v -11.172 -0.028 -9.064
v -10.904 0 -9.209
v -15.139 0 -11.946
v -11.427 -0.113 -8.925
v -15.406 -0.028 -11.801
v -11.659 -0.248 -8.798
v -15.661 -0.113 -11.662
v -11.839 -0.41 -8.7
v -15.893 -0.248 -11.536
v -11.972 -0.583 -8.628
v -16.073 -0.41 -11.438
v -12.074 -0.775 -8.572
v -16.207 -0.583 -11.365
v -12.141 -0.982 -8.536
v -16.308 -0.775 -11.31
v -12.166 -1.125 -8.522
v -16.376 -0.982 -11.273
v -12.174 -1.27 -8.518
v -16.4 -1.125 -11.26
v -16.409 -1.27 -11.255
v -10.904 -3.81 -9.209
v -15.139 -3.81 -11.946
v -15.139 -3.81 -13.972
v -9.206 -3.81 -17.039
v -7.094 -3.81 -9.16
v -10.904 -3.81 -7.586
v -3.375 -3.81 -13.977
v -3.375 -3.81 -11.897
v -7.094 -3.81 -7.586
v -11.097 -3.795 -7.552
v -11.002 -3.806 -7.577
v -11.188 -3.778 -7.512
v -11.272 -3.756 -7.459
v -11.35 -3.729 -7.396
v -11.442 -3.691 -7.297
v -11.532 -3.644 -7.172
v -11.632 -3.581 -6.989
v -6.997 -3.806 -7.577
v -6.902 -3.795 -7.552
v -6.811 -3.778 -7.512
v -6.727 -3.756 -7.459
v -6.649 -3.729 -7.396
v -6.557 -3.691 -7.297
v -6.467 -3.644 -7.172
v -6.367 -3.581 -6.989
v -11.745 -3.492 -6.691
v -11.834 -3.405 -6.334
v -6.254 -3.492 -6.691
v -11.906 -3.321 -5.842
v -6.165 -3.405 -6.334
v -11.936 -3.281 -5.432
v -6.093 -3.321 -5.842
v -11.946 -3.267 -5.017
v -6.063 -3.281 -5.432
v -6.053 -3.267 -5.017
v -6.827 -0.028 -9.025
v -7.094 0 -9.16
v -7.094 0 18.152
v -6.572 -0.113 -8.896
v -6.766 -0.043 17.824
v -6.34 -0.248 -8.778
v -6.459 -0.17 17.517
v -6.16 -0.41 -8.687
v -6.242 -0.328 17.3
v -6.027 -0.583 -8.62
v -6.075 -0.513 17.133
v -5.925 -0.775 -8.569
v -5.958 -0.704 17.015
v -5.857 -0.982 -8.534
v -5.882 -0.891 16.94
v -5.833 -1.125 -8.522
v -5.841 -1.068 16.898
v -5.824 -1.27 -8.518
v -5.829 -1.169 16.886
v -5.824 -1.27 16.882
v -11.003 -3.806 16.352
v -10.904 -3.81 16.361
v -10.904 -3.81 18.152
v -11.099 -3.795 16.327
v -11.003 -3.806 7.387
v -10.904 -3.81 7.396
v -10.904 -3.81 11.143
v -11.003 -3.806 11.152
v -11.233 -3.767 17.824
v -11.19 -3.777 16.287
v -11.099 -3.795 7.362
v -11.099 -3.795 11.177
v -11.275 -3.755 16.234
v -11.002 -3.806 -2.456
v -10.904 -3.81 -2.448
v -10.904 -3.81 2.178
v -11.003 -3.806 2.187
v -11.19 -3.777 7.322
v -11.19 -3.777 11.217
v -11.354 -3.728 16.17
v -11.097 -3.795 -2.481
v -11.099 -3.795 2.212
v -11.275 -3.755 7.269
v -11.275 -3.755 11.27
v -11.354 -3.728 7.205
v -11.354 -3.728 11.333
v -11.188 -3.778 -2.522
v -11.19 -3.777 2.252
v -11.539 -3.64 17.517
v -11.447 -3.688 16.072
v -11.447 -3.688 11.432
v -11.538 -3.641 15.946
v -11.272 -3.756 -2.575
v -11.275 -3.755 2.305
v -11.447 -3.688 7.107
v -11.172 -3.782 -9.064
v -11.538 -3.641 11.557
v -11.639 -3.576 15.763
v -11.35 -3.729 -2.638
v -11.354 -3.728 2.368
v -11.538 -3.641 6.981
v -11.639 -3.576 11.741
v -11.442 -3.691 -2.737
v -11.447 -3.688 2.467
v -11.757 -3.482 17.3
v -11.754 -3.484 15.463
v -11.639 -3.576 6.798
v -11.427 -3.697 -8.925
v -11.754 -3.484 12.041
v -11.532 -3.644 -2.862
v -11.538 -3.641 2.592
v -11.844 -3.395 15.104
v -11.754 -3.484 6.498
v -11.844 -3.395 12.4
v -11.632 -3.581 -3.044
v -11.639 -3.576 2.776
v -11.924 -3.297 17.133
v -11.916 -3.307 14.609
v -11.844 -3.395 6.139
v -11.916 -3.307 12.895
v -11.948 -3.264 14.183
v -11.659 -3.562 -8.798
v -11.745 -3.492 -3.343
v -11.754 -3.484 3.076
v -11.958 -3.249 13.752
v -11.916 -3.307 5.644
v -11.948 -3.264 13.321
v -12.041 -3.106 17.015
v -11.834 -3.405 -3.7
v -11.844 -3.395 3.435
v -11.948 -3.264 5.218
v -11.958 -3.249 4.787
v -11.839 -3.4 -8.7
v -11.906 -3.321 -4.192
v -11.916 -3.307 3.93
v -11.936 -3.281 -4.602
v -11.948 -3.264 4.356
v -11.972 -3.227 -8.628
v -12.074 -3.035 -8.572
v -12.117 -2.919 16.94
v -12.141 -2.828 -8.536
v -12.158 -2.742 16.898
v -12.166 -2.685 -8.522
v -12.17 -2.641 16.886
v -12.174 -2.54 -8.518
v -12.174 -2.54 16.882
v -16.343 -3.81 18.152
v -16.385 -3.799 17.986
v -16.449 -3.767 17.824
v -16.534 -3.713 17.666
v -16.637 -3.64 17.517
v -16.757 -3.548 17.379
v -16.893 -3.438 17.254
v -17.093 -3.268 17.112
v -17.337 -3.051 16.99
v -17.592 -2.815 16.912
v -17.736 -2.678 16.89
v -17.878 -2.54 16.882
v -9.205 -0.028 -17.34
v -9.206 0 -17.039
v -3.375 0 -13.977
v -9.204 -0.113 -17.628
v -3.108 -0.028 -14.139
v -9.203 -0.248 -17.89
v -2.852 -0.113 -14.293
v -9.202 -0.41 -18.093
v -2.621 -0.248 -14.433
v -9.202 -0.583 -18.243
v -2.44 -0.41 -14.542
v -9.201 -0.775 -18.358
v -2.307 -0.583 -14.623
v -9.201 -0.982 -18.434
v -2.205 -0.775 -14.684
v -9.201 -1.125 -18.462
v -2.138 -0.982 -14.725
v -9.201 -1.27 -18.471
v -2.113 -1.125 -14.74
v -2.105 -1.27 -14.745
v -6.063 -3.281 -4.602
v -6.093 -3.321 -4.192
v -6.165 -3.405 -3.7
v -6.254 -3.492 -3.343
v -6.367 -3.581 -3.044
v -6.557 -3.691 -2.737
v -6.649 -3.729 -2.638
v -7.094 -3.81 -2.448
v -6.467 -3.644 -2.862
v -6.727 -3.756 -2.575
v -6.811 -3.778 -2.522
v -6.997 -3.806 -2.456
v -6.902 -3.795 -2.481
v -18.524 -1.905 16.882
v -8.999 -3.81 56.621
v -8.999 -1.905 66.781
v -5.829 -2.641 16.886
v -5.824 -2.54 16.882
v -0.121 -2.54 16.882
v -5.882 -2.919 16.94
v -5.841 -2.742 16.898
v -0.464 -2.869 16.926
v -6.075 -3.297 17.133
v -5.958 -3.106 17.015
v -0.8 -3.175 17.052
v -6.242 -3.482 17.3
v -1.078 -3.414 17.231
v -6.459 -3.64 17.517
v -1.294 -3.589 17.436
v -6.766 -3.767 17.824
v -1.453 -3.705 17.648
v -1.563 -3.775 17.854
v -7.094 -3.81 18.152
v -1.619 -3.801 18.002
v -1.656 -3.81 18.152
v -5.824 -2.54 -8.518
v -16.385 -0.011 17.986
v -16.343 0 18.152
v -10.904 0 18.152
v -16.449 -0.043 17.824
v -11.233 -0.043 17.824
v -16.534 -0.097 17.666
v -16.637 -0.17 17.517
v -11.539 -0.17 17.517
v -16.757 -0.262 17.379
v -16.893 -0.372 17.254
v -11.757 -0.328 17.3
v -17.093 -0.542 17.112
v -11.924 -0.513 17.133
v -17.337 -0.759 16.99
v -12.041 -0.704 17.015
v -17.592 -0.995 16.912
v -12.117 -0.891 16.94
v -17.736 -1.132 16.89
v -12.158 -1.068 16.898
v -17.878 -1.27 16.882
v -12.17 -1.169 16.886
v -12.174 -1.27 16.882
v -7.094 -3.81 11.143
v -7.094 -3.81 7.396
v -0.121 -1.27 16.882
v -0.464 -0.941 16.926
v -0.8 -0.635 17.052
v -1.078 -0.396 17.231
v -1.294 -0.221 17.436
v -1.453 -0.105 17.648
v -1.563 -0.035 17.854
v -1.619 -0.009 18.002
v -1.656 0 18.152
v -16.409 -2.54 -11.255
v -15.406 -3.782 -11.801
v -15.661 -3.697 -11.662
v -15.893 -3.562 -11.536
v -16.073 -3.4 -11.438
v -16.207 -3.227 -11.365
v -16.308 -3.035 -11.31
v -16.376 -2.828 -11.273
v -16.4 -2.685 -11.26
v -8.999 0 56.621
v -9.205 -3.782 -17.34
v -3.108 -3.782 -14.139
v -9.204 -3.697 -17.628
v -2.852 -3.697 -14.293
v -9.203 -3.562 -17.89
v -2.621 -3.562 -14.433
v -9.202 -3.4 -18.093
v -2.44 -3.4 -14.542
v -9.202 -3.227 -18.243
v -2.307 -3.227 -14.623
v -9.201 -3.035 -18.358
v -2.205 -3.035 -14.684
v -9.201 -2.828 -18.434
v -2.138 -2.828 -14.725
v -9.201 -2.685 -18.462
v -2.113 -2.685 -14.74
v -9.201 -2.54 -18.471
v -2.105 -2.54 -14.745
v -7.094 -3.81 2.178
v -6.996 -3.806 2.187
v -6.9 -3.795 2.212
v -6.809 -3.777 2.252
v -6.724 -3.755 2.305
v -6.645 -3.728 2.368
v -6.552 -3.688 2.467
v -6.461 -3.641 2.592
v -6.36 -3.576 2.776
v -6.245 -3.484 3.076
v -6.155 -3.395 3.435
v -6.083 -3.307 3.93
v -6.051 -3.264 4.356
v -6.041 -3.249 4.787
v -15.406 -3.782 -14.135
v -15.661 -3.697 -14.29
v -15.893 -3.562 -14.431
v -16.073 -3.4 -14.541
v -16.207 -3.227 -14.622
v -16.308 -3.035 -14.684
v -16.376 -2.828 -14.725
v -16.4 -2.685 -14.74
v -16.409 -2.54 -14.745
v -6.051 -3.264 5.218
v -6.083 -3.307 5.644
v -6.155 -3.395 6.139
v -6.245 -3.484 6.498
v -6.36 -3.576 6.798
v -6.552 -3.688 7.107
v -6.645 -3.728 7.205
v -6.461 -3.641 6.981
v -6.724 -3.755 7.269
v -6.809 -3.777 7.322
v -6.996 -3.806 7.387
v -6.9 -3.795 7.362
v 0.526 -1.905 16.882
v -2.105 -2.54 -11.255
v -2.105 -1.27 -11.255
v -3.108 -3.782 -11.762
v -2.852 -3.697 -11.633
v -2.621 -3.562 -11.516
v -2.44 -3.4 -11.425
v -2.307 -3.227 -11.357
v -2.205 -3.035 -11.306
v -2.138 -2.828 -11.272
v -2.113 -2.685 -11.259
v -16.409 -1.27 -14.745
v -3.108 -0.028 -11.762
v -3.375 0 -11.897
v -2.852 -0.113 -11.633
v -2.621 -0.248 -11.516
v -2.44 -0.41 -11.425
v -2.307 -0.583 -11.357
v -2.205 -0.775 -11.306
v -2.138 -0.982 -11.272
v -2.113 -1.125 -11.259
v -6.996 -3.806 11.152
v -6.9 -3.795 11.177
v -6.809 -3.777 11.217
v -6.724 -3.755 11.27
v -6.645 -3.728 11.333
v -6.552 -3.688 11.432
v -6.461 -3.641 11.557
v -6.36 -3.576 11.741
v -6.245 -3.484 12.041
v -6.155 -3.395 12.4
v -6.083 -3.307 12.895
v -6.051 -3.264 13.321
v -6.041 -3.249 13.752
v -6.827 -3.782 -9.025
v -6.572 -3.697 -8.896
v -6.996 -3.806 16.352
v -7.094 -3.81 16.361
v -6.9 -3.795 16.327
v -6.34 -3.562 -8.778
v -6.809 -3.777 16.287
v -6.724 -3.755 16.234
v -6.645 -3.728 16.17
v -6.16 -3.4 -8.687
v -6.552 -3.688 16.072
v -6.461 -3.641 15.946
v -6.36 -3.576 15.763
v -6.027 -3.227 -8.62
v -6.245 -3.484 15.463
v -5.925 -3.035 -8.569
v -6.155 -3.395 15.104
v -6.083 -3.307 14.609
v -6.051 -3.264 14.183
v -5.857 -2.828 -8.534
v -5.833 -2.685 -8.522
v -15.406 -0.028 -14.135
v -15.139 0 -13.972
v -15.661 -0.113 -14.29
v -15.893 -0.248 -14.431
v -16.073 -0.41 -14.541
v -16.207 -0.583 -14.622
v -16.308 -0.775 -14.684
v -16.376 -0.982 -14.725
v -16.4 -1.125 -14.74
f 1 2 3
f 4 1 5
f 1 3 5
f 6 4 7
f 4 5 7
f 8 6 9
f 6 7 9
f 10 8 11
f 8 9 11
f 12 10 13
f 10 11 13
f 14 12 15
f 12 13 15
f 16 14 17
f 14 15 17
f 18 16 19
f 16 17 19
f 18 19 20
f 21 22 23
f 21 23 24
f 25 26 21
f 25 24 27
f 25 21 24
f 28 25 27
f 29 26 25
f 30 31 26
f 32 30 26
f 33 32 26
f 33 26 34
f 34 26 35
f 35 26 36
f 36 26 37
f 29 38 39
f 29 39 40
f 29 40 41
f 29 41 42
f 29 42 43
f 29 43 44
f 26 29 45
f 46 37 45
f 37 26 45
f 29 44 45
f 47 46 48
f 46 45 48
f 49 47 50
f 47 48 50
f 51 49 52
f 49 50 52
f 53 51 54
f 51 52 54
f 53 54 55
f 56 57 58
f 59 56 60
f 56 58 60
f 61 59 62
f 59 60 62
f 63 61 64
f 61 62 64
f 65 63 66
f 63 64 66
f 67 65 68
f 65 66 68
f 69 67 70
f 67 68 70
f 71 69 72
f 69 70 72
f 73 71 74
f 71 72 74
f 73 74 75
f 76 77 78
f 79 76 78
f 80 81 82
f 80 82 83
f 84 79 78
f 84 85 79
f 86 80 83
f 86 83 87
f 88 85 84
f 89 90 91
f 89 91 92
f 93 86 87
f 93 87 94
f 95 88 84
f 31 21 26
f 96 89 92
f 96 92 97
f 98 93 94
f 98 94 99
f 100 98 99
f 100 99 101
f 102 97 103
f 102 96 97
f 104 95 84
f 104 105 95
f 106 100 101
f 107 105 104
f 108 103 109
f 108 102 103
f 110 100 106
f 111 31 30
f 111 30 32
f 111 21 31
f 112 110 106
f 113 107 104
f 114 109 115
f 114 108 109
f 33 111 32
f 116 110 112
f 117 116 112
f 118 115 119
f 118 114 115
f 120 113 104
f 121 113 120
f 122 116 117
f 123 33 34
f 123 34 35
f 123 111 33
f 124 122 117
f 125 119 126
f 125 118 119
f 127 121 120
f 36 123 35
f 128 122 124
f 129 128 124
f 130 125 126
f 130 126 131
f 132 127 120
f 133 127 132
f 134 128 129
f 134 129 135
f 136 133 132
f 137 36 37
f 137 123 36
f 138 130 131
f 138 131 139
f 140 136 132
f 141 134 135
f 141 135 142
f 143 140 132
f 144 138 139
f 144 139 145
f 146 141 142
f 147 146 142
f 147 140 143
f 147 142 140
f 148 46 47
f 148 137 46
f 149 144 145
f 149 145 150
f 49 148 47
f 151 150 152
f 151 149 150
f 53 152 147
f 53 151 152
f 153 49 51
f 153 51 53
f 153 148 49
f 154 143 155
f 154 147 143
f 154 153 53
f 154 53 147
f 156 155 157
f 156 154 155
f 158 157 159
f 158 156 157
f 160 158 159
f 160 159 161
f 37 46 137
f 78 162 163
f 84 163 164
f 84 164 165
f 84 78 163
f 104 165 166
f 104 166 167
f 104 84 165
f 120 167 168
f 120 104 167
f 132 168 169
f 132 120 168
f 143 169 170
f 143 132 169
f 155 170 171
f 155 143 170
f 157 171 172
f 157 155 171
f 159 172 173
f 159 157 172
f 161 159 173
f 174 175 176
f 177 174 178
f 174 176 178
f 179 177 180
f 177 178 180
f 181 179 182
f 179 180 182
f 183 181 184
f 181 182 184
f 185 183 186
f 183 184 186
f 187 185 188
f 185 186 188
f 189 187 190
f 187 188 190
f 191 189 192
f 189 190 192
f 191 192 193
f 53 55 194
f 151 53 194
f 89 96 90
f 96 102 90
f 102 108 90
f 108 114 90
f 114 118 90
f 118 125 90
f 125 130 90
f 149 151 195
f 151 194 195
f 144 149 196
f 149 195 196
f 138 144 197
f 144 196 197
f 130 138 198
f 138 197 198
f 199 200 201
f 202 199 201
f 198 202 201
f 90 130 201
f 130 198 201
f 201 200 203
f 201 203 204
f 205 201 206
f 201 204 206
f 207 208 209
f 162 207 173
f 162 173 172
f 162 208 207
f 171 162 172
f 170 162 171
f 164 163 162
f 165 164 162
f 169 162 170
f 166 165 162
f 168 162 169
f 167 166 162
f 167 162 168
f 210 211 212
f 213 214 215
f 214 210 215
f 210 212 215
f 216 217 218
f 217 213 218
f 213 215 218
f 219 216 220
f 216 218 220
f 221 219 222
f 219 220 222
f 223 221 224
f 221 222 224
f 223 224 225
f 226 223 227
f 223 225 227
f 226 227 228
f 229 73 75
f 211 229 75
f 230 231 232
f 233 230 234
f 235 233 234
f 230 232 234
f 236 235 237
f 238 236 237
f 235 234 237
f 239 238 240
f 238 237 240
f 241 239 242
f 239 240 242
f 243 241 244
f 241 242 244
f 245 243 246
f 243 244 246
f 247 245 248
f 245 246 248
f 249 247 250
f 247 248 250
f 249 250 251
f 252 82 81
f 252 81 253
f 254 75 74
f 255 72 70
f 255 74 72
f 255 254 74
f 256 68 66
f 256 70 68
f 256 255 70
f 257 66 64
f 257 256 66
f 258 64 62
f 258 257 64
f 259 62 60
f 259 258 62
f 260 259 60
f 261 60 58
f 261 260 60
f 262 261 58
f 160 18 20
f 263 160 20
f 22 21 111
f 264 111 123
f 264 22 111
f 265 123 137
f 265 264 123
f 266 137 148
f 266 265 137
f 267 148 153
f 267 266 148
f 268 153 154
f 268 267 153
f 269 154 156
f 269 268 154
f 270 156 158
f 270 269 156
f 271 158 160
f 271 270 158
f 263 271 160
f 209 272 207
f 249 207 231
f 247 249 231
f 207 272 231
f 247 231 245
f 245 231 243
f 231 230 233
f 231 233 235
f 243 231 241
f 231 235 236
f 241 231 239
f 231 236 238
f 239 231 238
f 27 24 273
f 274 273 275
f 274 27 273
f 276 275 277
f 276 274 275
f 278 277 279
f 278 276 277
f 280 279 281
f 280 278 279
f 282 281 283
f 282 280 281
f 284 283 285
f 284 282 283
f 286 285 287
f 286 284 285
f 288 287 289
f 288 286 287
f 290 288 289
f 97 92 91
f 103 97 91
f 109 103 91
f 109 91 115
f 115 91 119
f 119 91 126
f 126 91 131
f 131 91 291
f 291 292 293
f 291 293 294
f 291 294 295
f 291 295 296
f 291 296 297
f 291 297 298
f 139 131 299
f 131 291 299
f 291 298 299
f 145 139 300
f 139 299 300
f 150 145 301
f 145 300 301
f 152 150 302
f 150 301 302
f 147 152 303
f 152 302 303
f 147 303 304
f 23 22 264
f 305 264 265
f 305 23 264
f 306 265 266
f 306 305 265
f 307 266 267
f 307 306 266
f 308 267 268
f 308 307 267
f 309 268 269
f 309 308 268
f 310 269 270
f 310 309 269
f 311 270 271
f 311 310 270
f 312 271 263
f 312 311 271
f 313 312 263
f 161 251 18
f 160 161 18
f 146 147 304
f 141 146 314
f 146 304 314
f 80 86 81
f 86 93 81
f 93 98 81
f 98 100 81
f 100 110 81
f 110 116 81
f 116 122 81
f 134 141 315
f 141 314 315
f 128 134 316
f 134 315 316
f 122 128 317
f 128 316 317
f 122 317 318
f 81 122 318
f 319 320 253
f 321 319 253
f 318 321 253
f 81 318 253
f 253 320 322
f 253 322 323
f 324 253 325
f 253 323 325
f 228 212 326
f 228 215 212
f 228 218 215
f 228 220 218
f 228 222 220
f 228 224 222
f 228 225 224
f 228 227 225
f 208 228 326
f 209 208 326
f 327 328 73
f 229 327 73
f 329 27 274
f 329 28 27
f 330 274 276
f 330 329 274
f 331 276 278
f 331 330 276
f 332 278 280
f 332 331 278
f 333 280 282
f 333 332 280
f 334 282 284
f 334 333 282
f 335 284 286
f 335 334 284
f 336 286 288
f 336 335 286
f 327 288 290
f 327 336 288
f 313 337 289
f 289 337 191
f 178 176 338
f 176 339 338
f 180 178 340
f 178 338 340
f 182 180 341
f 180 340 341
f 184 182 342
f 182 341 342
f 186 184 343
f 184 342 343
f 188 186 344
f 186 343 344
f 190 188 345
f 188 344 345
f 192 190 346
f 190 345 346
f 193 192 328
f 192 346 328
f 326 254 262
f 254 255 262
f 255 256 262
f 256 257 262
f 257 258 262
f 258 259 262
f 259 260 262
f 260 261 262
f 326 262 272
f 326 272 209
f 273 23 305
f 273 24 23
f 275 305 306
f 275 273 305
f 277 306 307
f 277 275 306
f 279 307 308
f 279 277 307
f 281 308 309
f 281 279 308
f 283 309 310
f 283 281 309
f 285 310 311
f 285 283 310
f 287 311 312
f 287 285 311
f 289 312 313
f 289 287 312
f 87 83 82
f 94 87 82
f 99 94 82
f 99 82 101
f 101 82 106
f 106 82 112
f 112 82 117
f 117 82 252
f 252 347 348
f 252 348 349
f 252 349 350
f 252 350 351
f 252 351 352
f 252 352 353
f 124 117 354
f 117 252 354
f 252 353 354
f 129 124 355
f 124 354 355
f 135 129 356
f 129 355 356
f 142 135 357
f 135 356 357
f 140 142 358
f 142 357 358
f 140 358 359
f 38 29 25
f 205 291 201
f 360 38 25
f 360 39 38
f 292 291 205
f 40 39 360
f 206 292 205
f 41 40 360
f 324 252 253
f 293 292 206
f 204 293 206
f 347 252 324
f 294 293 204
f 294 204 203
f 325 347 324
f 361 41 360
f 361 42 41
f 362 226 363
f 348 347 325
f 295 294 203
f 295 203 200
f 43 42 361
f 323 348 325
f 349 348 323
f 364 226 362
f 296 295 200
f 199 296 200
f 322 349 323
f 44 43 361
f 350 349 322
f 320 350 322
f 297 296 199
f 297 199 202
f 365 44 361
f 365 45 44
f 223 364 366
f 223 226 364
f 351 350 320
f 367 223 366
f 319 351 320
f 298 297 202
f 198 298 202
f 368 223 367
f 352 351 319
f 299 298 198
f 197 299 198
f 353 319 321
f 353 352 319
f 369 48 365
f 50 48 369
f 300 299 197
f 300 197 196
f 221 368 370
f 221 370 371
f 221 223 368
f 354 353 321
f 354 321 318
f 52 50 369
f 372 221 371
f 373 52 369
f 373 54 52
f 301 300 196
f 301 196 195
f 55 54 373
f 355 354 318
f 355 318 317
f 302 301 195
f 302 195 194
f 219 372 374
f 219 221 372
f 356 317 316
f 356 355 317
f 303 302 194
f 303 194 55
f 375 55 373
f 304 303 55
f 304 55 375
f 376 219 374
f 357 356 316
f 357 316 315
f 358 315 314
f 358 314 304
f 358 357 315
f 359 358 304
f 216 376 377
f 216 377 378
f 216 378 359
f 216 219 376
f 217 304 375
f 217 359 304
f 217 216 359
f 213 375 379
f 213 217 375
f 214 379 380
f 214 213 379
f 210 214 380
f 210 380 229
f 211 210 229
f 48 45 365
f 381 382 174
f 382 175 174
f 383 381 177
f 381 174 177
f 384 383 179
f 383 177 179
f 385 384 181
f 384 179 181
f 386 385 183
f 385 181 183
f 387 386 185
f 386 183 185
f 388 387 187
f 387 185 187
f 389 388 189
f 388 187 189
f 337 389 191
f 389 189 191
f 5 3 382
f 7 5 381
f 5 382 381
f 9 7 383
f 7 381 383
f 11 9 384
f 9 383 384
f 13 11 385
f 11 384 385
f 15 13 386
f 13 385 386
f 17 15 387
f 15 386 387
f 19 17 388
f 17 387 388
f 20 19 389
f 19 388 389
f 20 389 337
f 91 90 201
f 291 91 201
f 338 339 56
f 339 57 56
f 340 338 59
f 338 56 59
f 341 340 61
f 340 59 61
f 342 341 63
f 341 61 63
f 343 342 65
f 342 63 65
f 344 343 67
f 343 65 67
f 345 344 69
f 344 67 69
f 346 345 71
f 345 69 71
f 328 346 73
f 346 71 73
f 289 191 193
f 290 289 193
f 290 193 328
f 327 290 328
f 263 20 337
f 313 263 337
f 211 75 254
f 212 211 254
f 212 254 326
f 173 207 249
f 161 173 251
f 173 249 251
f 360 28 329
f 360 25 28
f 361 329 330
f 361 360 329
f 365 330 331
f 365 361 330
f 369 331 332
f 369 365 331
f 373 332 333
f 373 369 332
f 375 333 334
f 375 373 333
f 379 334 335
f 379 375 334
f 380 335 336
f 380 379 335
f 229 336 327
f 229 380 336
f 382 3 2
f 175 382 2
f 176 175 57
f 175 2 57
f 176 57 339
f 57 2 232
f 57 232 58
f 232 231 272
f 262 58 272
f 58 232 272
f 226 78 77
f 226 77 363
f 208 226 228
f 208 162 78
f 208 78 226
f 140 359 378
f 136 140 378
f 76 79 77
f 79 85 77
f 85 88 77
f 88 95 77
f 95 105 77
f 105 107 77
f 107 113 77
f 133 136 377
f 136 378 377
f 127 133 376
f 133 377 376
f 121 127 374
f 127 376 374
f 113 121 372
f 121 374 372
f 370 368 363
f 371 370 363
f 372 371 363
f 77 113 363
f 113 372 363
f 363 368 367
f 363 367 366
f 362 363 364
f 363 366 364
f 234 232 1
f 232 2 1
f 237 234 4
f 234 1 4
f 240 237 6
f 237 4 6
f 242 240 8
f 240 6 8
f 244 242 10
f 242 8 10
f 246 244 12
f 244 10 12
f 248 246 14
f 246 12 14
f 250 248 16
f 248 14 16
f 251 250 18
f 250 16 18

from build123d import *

# Parameters (mm, degrees)
F1_DEPTH = 3.81
F2_SIZE  = 1.90499
F3_R     = 1.27
F5_DEPTH = 25.4


# Not quite as in the source:
# - a fillet or chamfer is up to 0.001 mm smaller than in the source, because OpenCascade refuses the exact size
# - a feature names something its author has since deleted; it is built from what else it names


with BuildPart() as f1:
    # F0 (on Front) → F1 (new body)
    with BuildSketch(Plane.XZ):
        Polygon((-12.1744828463, 16.8822405368), (-12.1744828463, -8.5177594632), (-16.408668831, -11.2550966442), (-16.408668831, -14.7449430078), (-9.2011271045, -18.4709690511), (-2.1051054355, -14.7449430078), (-2.1051054355, -11.2550966442), (-5.8244828463, -8.5177594632), (-5.8244828463, 16.8822405368), (0.5255171537, 16.8822405368), (-8.9994828463, 66.7812823613), (-18.5244828463, 16.8822405368), align=None)
    extrude(amount=F1_DEPTH)

    # F2 (size 1.905 in the source; OpenCascade refuses exactly that, so slightly less here)
    f2_edges = [f1.edges().sort_by_distance(p)[0] for p in [
        (-13.761983, -3.81, 41.831761),
        (-4.236983, -3.81, 41.831761),
        (-13.761983, 0, 41.831761),
        (-4.236983, 0, 41.831761),
    ]]
    chamfer(f2_edges, length=F2_SIZE)

    # F3
    f3_edges = [f1.edges().sort_by_distance(p)[0] for p in [
        (-12.174483, -3.81, 4.182241),
        (-5.824483, -3.81, 4.182241),
        (-12.174483, 0, 4.182241),
        (-5.824483, 0, 4.182241),
        (-14.37979, -3.81, 16.882241),
        (-3.619176, 0, 16.882241),
        (-3.619176, -3.81, 16.882241),
        (-14.37979, 0, 16.882241),
        (-14.291576, -3.81, -9.886428),
        (-16.408669, -3.81, -13.00002),
        (-12.804898, -3.81, -16.607956),
        (-5.653116, -3.81, -16.607956),
        (-2.105105, -3.81, -13.00002),
        (-3.964794, -3.81, -9.886428),
        (-14.291576, 0, -9.886428),
        (-3.964794, 0, -9.886428),
        (-2.105105, 0, -13.00002),
        (-5.653116, 0, -16.607956),
        (-12.804898, 0, -16.607956),
        (-16.408669, 0, -13.00002),
    ]]
    fillet(f3_edges, radius=F3_R)

    # F4 (on Right) → F5 (cut)
    with BuildSketch(Plane.YZ):
        with BuildLine():
            ThreePointArc((-5.1016697734, 9.2693595216), (-3.730698506, 11.3268088009), (-3.2493867144, 13.7518858537))
            ThreePointArc((-3.2493867144, 13.7518858537), (-12.0244637672, 19.6205740621), (-14.0971036554, 9.2693595216))
            ThreePointArc((-14.0971036554, 9.2693595216), (-9.5993867144, 11.1368331894), (-5.1016697734, 9.2693595216))
        make_face()
        with BuildLine():
            ThreePointArc((-5.1016697734, 9.2693595216), (-9.5993867144, 11.1368331894), (-14.0971036554, 9.2693595216))
            ThreePointArc((-14.0971036554, 9.2693595216), (-9.5993867144, 7.4018858537), (-5.1016697734, 9.2693595216))
        make_face()
        with BuildLine():
            ThreePointArc((-5.1016697734, 9.2693595216), (-9.5993867144, 7.4018858537), (-14.0971036554, 9.2693595216))
            ThreePointArc((-14.0971036554, 9.2693595216), (-15.9420131796, 4.4809091421), (-13.6448170782, -0.107754962))
            ThreePointArc((-13.6448170782, -0.107754962), (-9.6056271037, 1.3330596991), (-5.571670106, -0.1223417843))
            ThreePointArc((-5.571670106, -0.1223417843), (-3.8592429678, 2.0714603295), (-3.2493867144, 4.7868331894))
            ThreePointArc((-3.2493867144, 4.7868331894), (-3.730698506, 7.2119102423), (-5.1016697734, 9.2693595216))
        make_face()
        with BuildLine():
            ThreePointArc((-5.571670106, -0.1223417843), (-9.6108600804, -1.5631564454), (-13.6448170782, -0.107754962))
            ThreePointArc((-13.6448170782, -0.107754962), (-12.3324733297, -10.7570736823), (-3.2671004698, -5.0169299357))
            ThreePointArc((-3.2671004698, -5.0169299357), (-3.8720598777, -2.311932968), (-5.571670106, -0.1223417843))
        make_face()
        with BuildLine():
            ThreePointArc((-5.571670106, -0.1223417843), (-9.6056271037, 1.3330596991), (-13.6448170782, -0.107754962))
            ThreePointArc((-13.6448170782, -0.107754962), (-9.6108600804, -1.5631564454), (-5.571670106, -0.1223417843))
        make_face()
    extrude(amount=-F5_DEPTH, mode=Mode.SUBTRACT)


solid = f1.part
